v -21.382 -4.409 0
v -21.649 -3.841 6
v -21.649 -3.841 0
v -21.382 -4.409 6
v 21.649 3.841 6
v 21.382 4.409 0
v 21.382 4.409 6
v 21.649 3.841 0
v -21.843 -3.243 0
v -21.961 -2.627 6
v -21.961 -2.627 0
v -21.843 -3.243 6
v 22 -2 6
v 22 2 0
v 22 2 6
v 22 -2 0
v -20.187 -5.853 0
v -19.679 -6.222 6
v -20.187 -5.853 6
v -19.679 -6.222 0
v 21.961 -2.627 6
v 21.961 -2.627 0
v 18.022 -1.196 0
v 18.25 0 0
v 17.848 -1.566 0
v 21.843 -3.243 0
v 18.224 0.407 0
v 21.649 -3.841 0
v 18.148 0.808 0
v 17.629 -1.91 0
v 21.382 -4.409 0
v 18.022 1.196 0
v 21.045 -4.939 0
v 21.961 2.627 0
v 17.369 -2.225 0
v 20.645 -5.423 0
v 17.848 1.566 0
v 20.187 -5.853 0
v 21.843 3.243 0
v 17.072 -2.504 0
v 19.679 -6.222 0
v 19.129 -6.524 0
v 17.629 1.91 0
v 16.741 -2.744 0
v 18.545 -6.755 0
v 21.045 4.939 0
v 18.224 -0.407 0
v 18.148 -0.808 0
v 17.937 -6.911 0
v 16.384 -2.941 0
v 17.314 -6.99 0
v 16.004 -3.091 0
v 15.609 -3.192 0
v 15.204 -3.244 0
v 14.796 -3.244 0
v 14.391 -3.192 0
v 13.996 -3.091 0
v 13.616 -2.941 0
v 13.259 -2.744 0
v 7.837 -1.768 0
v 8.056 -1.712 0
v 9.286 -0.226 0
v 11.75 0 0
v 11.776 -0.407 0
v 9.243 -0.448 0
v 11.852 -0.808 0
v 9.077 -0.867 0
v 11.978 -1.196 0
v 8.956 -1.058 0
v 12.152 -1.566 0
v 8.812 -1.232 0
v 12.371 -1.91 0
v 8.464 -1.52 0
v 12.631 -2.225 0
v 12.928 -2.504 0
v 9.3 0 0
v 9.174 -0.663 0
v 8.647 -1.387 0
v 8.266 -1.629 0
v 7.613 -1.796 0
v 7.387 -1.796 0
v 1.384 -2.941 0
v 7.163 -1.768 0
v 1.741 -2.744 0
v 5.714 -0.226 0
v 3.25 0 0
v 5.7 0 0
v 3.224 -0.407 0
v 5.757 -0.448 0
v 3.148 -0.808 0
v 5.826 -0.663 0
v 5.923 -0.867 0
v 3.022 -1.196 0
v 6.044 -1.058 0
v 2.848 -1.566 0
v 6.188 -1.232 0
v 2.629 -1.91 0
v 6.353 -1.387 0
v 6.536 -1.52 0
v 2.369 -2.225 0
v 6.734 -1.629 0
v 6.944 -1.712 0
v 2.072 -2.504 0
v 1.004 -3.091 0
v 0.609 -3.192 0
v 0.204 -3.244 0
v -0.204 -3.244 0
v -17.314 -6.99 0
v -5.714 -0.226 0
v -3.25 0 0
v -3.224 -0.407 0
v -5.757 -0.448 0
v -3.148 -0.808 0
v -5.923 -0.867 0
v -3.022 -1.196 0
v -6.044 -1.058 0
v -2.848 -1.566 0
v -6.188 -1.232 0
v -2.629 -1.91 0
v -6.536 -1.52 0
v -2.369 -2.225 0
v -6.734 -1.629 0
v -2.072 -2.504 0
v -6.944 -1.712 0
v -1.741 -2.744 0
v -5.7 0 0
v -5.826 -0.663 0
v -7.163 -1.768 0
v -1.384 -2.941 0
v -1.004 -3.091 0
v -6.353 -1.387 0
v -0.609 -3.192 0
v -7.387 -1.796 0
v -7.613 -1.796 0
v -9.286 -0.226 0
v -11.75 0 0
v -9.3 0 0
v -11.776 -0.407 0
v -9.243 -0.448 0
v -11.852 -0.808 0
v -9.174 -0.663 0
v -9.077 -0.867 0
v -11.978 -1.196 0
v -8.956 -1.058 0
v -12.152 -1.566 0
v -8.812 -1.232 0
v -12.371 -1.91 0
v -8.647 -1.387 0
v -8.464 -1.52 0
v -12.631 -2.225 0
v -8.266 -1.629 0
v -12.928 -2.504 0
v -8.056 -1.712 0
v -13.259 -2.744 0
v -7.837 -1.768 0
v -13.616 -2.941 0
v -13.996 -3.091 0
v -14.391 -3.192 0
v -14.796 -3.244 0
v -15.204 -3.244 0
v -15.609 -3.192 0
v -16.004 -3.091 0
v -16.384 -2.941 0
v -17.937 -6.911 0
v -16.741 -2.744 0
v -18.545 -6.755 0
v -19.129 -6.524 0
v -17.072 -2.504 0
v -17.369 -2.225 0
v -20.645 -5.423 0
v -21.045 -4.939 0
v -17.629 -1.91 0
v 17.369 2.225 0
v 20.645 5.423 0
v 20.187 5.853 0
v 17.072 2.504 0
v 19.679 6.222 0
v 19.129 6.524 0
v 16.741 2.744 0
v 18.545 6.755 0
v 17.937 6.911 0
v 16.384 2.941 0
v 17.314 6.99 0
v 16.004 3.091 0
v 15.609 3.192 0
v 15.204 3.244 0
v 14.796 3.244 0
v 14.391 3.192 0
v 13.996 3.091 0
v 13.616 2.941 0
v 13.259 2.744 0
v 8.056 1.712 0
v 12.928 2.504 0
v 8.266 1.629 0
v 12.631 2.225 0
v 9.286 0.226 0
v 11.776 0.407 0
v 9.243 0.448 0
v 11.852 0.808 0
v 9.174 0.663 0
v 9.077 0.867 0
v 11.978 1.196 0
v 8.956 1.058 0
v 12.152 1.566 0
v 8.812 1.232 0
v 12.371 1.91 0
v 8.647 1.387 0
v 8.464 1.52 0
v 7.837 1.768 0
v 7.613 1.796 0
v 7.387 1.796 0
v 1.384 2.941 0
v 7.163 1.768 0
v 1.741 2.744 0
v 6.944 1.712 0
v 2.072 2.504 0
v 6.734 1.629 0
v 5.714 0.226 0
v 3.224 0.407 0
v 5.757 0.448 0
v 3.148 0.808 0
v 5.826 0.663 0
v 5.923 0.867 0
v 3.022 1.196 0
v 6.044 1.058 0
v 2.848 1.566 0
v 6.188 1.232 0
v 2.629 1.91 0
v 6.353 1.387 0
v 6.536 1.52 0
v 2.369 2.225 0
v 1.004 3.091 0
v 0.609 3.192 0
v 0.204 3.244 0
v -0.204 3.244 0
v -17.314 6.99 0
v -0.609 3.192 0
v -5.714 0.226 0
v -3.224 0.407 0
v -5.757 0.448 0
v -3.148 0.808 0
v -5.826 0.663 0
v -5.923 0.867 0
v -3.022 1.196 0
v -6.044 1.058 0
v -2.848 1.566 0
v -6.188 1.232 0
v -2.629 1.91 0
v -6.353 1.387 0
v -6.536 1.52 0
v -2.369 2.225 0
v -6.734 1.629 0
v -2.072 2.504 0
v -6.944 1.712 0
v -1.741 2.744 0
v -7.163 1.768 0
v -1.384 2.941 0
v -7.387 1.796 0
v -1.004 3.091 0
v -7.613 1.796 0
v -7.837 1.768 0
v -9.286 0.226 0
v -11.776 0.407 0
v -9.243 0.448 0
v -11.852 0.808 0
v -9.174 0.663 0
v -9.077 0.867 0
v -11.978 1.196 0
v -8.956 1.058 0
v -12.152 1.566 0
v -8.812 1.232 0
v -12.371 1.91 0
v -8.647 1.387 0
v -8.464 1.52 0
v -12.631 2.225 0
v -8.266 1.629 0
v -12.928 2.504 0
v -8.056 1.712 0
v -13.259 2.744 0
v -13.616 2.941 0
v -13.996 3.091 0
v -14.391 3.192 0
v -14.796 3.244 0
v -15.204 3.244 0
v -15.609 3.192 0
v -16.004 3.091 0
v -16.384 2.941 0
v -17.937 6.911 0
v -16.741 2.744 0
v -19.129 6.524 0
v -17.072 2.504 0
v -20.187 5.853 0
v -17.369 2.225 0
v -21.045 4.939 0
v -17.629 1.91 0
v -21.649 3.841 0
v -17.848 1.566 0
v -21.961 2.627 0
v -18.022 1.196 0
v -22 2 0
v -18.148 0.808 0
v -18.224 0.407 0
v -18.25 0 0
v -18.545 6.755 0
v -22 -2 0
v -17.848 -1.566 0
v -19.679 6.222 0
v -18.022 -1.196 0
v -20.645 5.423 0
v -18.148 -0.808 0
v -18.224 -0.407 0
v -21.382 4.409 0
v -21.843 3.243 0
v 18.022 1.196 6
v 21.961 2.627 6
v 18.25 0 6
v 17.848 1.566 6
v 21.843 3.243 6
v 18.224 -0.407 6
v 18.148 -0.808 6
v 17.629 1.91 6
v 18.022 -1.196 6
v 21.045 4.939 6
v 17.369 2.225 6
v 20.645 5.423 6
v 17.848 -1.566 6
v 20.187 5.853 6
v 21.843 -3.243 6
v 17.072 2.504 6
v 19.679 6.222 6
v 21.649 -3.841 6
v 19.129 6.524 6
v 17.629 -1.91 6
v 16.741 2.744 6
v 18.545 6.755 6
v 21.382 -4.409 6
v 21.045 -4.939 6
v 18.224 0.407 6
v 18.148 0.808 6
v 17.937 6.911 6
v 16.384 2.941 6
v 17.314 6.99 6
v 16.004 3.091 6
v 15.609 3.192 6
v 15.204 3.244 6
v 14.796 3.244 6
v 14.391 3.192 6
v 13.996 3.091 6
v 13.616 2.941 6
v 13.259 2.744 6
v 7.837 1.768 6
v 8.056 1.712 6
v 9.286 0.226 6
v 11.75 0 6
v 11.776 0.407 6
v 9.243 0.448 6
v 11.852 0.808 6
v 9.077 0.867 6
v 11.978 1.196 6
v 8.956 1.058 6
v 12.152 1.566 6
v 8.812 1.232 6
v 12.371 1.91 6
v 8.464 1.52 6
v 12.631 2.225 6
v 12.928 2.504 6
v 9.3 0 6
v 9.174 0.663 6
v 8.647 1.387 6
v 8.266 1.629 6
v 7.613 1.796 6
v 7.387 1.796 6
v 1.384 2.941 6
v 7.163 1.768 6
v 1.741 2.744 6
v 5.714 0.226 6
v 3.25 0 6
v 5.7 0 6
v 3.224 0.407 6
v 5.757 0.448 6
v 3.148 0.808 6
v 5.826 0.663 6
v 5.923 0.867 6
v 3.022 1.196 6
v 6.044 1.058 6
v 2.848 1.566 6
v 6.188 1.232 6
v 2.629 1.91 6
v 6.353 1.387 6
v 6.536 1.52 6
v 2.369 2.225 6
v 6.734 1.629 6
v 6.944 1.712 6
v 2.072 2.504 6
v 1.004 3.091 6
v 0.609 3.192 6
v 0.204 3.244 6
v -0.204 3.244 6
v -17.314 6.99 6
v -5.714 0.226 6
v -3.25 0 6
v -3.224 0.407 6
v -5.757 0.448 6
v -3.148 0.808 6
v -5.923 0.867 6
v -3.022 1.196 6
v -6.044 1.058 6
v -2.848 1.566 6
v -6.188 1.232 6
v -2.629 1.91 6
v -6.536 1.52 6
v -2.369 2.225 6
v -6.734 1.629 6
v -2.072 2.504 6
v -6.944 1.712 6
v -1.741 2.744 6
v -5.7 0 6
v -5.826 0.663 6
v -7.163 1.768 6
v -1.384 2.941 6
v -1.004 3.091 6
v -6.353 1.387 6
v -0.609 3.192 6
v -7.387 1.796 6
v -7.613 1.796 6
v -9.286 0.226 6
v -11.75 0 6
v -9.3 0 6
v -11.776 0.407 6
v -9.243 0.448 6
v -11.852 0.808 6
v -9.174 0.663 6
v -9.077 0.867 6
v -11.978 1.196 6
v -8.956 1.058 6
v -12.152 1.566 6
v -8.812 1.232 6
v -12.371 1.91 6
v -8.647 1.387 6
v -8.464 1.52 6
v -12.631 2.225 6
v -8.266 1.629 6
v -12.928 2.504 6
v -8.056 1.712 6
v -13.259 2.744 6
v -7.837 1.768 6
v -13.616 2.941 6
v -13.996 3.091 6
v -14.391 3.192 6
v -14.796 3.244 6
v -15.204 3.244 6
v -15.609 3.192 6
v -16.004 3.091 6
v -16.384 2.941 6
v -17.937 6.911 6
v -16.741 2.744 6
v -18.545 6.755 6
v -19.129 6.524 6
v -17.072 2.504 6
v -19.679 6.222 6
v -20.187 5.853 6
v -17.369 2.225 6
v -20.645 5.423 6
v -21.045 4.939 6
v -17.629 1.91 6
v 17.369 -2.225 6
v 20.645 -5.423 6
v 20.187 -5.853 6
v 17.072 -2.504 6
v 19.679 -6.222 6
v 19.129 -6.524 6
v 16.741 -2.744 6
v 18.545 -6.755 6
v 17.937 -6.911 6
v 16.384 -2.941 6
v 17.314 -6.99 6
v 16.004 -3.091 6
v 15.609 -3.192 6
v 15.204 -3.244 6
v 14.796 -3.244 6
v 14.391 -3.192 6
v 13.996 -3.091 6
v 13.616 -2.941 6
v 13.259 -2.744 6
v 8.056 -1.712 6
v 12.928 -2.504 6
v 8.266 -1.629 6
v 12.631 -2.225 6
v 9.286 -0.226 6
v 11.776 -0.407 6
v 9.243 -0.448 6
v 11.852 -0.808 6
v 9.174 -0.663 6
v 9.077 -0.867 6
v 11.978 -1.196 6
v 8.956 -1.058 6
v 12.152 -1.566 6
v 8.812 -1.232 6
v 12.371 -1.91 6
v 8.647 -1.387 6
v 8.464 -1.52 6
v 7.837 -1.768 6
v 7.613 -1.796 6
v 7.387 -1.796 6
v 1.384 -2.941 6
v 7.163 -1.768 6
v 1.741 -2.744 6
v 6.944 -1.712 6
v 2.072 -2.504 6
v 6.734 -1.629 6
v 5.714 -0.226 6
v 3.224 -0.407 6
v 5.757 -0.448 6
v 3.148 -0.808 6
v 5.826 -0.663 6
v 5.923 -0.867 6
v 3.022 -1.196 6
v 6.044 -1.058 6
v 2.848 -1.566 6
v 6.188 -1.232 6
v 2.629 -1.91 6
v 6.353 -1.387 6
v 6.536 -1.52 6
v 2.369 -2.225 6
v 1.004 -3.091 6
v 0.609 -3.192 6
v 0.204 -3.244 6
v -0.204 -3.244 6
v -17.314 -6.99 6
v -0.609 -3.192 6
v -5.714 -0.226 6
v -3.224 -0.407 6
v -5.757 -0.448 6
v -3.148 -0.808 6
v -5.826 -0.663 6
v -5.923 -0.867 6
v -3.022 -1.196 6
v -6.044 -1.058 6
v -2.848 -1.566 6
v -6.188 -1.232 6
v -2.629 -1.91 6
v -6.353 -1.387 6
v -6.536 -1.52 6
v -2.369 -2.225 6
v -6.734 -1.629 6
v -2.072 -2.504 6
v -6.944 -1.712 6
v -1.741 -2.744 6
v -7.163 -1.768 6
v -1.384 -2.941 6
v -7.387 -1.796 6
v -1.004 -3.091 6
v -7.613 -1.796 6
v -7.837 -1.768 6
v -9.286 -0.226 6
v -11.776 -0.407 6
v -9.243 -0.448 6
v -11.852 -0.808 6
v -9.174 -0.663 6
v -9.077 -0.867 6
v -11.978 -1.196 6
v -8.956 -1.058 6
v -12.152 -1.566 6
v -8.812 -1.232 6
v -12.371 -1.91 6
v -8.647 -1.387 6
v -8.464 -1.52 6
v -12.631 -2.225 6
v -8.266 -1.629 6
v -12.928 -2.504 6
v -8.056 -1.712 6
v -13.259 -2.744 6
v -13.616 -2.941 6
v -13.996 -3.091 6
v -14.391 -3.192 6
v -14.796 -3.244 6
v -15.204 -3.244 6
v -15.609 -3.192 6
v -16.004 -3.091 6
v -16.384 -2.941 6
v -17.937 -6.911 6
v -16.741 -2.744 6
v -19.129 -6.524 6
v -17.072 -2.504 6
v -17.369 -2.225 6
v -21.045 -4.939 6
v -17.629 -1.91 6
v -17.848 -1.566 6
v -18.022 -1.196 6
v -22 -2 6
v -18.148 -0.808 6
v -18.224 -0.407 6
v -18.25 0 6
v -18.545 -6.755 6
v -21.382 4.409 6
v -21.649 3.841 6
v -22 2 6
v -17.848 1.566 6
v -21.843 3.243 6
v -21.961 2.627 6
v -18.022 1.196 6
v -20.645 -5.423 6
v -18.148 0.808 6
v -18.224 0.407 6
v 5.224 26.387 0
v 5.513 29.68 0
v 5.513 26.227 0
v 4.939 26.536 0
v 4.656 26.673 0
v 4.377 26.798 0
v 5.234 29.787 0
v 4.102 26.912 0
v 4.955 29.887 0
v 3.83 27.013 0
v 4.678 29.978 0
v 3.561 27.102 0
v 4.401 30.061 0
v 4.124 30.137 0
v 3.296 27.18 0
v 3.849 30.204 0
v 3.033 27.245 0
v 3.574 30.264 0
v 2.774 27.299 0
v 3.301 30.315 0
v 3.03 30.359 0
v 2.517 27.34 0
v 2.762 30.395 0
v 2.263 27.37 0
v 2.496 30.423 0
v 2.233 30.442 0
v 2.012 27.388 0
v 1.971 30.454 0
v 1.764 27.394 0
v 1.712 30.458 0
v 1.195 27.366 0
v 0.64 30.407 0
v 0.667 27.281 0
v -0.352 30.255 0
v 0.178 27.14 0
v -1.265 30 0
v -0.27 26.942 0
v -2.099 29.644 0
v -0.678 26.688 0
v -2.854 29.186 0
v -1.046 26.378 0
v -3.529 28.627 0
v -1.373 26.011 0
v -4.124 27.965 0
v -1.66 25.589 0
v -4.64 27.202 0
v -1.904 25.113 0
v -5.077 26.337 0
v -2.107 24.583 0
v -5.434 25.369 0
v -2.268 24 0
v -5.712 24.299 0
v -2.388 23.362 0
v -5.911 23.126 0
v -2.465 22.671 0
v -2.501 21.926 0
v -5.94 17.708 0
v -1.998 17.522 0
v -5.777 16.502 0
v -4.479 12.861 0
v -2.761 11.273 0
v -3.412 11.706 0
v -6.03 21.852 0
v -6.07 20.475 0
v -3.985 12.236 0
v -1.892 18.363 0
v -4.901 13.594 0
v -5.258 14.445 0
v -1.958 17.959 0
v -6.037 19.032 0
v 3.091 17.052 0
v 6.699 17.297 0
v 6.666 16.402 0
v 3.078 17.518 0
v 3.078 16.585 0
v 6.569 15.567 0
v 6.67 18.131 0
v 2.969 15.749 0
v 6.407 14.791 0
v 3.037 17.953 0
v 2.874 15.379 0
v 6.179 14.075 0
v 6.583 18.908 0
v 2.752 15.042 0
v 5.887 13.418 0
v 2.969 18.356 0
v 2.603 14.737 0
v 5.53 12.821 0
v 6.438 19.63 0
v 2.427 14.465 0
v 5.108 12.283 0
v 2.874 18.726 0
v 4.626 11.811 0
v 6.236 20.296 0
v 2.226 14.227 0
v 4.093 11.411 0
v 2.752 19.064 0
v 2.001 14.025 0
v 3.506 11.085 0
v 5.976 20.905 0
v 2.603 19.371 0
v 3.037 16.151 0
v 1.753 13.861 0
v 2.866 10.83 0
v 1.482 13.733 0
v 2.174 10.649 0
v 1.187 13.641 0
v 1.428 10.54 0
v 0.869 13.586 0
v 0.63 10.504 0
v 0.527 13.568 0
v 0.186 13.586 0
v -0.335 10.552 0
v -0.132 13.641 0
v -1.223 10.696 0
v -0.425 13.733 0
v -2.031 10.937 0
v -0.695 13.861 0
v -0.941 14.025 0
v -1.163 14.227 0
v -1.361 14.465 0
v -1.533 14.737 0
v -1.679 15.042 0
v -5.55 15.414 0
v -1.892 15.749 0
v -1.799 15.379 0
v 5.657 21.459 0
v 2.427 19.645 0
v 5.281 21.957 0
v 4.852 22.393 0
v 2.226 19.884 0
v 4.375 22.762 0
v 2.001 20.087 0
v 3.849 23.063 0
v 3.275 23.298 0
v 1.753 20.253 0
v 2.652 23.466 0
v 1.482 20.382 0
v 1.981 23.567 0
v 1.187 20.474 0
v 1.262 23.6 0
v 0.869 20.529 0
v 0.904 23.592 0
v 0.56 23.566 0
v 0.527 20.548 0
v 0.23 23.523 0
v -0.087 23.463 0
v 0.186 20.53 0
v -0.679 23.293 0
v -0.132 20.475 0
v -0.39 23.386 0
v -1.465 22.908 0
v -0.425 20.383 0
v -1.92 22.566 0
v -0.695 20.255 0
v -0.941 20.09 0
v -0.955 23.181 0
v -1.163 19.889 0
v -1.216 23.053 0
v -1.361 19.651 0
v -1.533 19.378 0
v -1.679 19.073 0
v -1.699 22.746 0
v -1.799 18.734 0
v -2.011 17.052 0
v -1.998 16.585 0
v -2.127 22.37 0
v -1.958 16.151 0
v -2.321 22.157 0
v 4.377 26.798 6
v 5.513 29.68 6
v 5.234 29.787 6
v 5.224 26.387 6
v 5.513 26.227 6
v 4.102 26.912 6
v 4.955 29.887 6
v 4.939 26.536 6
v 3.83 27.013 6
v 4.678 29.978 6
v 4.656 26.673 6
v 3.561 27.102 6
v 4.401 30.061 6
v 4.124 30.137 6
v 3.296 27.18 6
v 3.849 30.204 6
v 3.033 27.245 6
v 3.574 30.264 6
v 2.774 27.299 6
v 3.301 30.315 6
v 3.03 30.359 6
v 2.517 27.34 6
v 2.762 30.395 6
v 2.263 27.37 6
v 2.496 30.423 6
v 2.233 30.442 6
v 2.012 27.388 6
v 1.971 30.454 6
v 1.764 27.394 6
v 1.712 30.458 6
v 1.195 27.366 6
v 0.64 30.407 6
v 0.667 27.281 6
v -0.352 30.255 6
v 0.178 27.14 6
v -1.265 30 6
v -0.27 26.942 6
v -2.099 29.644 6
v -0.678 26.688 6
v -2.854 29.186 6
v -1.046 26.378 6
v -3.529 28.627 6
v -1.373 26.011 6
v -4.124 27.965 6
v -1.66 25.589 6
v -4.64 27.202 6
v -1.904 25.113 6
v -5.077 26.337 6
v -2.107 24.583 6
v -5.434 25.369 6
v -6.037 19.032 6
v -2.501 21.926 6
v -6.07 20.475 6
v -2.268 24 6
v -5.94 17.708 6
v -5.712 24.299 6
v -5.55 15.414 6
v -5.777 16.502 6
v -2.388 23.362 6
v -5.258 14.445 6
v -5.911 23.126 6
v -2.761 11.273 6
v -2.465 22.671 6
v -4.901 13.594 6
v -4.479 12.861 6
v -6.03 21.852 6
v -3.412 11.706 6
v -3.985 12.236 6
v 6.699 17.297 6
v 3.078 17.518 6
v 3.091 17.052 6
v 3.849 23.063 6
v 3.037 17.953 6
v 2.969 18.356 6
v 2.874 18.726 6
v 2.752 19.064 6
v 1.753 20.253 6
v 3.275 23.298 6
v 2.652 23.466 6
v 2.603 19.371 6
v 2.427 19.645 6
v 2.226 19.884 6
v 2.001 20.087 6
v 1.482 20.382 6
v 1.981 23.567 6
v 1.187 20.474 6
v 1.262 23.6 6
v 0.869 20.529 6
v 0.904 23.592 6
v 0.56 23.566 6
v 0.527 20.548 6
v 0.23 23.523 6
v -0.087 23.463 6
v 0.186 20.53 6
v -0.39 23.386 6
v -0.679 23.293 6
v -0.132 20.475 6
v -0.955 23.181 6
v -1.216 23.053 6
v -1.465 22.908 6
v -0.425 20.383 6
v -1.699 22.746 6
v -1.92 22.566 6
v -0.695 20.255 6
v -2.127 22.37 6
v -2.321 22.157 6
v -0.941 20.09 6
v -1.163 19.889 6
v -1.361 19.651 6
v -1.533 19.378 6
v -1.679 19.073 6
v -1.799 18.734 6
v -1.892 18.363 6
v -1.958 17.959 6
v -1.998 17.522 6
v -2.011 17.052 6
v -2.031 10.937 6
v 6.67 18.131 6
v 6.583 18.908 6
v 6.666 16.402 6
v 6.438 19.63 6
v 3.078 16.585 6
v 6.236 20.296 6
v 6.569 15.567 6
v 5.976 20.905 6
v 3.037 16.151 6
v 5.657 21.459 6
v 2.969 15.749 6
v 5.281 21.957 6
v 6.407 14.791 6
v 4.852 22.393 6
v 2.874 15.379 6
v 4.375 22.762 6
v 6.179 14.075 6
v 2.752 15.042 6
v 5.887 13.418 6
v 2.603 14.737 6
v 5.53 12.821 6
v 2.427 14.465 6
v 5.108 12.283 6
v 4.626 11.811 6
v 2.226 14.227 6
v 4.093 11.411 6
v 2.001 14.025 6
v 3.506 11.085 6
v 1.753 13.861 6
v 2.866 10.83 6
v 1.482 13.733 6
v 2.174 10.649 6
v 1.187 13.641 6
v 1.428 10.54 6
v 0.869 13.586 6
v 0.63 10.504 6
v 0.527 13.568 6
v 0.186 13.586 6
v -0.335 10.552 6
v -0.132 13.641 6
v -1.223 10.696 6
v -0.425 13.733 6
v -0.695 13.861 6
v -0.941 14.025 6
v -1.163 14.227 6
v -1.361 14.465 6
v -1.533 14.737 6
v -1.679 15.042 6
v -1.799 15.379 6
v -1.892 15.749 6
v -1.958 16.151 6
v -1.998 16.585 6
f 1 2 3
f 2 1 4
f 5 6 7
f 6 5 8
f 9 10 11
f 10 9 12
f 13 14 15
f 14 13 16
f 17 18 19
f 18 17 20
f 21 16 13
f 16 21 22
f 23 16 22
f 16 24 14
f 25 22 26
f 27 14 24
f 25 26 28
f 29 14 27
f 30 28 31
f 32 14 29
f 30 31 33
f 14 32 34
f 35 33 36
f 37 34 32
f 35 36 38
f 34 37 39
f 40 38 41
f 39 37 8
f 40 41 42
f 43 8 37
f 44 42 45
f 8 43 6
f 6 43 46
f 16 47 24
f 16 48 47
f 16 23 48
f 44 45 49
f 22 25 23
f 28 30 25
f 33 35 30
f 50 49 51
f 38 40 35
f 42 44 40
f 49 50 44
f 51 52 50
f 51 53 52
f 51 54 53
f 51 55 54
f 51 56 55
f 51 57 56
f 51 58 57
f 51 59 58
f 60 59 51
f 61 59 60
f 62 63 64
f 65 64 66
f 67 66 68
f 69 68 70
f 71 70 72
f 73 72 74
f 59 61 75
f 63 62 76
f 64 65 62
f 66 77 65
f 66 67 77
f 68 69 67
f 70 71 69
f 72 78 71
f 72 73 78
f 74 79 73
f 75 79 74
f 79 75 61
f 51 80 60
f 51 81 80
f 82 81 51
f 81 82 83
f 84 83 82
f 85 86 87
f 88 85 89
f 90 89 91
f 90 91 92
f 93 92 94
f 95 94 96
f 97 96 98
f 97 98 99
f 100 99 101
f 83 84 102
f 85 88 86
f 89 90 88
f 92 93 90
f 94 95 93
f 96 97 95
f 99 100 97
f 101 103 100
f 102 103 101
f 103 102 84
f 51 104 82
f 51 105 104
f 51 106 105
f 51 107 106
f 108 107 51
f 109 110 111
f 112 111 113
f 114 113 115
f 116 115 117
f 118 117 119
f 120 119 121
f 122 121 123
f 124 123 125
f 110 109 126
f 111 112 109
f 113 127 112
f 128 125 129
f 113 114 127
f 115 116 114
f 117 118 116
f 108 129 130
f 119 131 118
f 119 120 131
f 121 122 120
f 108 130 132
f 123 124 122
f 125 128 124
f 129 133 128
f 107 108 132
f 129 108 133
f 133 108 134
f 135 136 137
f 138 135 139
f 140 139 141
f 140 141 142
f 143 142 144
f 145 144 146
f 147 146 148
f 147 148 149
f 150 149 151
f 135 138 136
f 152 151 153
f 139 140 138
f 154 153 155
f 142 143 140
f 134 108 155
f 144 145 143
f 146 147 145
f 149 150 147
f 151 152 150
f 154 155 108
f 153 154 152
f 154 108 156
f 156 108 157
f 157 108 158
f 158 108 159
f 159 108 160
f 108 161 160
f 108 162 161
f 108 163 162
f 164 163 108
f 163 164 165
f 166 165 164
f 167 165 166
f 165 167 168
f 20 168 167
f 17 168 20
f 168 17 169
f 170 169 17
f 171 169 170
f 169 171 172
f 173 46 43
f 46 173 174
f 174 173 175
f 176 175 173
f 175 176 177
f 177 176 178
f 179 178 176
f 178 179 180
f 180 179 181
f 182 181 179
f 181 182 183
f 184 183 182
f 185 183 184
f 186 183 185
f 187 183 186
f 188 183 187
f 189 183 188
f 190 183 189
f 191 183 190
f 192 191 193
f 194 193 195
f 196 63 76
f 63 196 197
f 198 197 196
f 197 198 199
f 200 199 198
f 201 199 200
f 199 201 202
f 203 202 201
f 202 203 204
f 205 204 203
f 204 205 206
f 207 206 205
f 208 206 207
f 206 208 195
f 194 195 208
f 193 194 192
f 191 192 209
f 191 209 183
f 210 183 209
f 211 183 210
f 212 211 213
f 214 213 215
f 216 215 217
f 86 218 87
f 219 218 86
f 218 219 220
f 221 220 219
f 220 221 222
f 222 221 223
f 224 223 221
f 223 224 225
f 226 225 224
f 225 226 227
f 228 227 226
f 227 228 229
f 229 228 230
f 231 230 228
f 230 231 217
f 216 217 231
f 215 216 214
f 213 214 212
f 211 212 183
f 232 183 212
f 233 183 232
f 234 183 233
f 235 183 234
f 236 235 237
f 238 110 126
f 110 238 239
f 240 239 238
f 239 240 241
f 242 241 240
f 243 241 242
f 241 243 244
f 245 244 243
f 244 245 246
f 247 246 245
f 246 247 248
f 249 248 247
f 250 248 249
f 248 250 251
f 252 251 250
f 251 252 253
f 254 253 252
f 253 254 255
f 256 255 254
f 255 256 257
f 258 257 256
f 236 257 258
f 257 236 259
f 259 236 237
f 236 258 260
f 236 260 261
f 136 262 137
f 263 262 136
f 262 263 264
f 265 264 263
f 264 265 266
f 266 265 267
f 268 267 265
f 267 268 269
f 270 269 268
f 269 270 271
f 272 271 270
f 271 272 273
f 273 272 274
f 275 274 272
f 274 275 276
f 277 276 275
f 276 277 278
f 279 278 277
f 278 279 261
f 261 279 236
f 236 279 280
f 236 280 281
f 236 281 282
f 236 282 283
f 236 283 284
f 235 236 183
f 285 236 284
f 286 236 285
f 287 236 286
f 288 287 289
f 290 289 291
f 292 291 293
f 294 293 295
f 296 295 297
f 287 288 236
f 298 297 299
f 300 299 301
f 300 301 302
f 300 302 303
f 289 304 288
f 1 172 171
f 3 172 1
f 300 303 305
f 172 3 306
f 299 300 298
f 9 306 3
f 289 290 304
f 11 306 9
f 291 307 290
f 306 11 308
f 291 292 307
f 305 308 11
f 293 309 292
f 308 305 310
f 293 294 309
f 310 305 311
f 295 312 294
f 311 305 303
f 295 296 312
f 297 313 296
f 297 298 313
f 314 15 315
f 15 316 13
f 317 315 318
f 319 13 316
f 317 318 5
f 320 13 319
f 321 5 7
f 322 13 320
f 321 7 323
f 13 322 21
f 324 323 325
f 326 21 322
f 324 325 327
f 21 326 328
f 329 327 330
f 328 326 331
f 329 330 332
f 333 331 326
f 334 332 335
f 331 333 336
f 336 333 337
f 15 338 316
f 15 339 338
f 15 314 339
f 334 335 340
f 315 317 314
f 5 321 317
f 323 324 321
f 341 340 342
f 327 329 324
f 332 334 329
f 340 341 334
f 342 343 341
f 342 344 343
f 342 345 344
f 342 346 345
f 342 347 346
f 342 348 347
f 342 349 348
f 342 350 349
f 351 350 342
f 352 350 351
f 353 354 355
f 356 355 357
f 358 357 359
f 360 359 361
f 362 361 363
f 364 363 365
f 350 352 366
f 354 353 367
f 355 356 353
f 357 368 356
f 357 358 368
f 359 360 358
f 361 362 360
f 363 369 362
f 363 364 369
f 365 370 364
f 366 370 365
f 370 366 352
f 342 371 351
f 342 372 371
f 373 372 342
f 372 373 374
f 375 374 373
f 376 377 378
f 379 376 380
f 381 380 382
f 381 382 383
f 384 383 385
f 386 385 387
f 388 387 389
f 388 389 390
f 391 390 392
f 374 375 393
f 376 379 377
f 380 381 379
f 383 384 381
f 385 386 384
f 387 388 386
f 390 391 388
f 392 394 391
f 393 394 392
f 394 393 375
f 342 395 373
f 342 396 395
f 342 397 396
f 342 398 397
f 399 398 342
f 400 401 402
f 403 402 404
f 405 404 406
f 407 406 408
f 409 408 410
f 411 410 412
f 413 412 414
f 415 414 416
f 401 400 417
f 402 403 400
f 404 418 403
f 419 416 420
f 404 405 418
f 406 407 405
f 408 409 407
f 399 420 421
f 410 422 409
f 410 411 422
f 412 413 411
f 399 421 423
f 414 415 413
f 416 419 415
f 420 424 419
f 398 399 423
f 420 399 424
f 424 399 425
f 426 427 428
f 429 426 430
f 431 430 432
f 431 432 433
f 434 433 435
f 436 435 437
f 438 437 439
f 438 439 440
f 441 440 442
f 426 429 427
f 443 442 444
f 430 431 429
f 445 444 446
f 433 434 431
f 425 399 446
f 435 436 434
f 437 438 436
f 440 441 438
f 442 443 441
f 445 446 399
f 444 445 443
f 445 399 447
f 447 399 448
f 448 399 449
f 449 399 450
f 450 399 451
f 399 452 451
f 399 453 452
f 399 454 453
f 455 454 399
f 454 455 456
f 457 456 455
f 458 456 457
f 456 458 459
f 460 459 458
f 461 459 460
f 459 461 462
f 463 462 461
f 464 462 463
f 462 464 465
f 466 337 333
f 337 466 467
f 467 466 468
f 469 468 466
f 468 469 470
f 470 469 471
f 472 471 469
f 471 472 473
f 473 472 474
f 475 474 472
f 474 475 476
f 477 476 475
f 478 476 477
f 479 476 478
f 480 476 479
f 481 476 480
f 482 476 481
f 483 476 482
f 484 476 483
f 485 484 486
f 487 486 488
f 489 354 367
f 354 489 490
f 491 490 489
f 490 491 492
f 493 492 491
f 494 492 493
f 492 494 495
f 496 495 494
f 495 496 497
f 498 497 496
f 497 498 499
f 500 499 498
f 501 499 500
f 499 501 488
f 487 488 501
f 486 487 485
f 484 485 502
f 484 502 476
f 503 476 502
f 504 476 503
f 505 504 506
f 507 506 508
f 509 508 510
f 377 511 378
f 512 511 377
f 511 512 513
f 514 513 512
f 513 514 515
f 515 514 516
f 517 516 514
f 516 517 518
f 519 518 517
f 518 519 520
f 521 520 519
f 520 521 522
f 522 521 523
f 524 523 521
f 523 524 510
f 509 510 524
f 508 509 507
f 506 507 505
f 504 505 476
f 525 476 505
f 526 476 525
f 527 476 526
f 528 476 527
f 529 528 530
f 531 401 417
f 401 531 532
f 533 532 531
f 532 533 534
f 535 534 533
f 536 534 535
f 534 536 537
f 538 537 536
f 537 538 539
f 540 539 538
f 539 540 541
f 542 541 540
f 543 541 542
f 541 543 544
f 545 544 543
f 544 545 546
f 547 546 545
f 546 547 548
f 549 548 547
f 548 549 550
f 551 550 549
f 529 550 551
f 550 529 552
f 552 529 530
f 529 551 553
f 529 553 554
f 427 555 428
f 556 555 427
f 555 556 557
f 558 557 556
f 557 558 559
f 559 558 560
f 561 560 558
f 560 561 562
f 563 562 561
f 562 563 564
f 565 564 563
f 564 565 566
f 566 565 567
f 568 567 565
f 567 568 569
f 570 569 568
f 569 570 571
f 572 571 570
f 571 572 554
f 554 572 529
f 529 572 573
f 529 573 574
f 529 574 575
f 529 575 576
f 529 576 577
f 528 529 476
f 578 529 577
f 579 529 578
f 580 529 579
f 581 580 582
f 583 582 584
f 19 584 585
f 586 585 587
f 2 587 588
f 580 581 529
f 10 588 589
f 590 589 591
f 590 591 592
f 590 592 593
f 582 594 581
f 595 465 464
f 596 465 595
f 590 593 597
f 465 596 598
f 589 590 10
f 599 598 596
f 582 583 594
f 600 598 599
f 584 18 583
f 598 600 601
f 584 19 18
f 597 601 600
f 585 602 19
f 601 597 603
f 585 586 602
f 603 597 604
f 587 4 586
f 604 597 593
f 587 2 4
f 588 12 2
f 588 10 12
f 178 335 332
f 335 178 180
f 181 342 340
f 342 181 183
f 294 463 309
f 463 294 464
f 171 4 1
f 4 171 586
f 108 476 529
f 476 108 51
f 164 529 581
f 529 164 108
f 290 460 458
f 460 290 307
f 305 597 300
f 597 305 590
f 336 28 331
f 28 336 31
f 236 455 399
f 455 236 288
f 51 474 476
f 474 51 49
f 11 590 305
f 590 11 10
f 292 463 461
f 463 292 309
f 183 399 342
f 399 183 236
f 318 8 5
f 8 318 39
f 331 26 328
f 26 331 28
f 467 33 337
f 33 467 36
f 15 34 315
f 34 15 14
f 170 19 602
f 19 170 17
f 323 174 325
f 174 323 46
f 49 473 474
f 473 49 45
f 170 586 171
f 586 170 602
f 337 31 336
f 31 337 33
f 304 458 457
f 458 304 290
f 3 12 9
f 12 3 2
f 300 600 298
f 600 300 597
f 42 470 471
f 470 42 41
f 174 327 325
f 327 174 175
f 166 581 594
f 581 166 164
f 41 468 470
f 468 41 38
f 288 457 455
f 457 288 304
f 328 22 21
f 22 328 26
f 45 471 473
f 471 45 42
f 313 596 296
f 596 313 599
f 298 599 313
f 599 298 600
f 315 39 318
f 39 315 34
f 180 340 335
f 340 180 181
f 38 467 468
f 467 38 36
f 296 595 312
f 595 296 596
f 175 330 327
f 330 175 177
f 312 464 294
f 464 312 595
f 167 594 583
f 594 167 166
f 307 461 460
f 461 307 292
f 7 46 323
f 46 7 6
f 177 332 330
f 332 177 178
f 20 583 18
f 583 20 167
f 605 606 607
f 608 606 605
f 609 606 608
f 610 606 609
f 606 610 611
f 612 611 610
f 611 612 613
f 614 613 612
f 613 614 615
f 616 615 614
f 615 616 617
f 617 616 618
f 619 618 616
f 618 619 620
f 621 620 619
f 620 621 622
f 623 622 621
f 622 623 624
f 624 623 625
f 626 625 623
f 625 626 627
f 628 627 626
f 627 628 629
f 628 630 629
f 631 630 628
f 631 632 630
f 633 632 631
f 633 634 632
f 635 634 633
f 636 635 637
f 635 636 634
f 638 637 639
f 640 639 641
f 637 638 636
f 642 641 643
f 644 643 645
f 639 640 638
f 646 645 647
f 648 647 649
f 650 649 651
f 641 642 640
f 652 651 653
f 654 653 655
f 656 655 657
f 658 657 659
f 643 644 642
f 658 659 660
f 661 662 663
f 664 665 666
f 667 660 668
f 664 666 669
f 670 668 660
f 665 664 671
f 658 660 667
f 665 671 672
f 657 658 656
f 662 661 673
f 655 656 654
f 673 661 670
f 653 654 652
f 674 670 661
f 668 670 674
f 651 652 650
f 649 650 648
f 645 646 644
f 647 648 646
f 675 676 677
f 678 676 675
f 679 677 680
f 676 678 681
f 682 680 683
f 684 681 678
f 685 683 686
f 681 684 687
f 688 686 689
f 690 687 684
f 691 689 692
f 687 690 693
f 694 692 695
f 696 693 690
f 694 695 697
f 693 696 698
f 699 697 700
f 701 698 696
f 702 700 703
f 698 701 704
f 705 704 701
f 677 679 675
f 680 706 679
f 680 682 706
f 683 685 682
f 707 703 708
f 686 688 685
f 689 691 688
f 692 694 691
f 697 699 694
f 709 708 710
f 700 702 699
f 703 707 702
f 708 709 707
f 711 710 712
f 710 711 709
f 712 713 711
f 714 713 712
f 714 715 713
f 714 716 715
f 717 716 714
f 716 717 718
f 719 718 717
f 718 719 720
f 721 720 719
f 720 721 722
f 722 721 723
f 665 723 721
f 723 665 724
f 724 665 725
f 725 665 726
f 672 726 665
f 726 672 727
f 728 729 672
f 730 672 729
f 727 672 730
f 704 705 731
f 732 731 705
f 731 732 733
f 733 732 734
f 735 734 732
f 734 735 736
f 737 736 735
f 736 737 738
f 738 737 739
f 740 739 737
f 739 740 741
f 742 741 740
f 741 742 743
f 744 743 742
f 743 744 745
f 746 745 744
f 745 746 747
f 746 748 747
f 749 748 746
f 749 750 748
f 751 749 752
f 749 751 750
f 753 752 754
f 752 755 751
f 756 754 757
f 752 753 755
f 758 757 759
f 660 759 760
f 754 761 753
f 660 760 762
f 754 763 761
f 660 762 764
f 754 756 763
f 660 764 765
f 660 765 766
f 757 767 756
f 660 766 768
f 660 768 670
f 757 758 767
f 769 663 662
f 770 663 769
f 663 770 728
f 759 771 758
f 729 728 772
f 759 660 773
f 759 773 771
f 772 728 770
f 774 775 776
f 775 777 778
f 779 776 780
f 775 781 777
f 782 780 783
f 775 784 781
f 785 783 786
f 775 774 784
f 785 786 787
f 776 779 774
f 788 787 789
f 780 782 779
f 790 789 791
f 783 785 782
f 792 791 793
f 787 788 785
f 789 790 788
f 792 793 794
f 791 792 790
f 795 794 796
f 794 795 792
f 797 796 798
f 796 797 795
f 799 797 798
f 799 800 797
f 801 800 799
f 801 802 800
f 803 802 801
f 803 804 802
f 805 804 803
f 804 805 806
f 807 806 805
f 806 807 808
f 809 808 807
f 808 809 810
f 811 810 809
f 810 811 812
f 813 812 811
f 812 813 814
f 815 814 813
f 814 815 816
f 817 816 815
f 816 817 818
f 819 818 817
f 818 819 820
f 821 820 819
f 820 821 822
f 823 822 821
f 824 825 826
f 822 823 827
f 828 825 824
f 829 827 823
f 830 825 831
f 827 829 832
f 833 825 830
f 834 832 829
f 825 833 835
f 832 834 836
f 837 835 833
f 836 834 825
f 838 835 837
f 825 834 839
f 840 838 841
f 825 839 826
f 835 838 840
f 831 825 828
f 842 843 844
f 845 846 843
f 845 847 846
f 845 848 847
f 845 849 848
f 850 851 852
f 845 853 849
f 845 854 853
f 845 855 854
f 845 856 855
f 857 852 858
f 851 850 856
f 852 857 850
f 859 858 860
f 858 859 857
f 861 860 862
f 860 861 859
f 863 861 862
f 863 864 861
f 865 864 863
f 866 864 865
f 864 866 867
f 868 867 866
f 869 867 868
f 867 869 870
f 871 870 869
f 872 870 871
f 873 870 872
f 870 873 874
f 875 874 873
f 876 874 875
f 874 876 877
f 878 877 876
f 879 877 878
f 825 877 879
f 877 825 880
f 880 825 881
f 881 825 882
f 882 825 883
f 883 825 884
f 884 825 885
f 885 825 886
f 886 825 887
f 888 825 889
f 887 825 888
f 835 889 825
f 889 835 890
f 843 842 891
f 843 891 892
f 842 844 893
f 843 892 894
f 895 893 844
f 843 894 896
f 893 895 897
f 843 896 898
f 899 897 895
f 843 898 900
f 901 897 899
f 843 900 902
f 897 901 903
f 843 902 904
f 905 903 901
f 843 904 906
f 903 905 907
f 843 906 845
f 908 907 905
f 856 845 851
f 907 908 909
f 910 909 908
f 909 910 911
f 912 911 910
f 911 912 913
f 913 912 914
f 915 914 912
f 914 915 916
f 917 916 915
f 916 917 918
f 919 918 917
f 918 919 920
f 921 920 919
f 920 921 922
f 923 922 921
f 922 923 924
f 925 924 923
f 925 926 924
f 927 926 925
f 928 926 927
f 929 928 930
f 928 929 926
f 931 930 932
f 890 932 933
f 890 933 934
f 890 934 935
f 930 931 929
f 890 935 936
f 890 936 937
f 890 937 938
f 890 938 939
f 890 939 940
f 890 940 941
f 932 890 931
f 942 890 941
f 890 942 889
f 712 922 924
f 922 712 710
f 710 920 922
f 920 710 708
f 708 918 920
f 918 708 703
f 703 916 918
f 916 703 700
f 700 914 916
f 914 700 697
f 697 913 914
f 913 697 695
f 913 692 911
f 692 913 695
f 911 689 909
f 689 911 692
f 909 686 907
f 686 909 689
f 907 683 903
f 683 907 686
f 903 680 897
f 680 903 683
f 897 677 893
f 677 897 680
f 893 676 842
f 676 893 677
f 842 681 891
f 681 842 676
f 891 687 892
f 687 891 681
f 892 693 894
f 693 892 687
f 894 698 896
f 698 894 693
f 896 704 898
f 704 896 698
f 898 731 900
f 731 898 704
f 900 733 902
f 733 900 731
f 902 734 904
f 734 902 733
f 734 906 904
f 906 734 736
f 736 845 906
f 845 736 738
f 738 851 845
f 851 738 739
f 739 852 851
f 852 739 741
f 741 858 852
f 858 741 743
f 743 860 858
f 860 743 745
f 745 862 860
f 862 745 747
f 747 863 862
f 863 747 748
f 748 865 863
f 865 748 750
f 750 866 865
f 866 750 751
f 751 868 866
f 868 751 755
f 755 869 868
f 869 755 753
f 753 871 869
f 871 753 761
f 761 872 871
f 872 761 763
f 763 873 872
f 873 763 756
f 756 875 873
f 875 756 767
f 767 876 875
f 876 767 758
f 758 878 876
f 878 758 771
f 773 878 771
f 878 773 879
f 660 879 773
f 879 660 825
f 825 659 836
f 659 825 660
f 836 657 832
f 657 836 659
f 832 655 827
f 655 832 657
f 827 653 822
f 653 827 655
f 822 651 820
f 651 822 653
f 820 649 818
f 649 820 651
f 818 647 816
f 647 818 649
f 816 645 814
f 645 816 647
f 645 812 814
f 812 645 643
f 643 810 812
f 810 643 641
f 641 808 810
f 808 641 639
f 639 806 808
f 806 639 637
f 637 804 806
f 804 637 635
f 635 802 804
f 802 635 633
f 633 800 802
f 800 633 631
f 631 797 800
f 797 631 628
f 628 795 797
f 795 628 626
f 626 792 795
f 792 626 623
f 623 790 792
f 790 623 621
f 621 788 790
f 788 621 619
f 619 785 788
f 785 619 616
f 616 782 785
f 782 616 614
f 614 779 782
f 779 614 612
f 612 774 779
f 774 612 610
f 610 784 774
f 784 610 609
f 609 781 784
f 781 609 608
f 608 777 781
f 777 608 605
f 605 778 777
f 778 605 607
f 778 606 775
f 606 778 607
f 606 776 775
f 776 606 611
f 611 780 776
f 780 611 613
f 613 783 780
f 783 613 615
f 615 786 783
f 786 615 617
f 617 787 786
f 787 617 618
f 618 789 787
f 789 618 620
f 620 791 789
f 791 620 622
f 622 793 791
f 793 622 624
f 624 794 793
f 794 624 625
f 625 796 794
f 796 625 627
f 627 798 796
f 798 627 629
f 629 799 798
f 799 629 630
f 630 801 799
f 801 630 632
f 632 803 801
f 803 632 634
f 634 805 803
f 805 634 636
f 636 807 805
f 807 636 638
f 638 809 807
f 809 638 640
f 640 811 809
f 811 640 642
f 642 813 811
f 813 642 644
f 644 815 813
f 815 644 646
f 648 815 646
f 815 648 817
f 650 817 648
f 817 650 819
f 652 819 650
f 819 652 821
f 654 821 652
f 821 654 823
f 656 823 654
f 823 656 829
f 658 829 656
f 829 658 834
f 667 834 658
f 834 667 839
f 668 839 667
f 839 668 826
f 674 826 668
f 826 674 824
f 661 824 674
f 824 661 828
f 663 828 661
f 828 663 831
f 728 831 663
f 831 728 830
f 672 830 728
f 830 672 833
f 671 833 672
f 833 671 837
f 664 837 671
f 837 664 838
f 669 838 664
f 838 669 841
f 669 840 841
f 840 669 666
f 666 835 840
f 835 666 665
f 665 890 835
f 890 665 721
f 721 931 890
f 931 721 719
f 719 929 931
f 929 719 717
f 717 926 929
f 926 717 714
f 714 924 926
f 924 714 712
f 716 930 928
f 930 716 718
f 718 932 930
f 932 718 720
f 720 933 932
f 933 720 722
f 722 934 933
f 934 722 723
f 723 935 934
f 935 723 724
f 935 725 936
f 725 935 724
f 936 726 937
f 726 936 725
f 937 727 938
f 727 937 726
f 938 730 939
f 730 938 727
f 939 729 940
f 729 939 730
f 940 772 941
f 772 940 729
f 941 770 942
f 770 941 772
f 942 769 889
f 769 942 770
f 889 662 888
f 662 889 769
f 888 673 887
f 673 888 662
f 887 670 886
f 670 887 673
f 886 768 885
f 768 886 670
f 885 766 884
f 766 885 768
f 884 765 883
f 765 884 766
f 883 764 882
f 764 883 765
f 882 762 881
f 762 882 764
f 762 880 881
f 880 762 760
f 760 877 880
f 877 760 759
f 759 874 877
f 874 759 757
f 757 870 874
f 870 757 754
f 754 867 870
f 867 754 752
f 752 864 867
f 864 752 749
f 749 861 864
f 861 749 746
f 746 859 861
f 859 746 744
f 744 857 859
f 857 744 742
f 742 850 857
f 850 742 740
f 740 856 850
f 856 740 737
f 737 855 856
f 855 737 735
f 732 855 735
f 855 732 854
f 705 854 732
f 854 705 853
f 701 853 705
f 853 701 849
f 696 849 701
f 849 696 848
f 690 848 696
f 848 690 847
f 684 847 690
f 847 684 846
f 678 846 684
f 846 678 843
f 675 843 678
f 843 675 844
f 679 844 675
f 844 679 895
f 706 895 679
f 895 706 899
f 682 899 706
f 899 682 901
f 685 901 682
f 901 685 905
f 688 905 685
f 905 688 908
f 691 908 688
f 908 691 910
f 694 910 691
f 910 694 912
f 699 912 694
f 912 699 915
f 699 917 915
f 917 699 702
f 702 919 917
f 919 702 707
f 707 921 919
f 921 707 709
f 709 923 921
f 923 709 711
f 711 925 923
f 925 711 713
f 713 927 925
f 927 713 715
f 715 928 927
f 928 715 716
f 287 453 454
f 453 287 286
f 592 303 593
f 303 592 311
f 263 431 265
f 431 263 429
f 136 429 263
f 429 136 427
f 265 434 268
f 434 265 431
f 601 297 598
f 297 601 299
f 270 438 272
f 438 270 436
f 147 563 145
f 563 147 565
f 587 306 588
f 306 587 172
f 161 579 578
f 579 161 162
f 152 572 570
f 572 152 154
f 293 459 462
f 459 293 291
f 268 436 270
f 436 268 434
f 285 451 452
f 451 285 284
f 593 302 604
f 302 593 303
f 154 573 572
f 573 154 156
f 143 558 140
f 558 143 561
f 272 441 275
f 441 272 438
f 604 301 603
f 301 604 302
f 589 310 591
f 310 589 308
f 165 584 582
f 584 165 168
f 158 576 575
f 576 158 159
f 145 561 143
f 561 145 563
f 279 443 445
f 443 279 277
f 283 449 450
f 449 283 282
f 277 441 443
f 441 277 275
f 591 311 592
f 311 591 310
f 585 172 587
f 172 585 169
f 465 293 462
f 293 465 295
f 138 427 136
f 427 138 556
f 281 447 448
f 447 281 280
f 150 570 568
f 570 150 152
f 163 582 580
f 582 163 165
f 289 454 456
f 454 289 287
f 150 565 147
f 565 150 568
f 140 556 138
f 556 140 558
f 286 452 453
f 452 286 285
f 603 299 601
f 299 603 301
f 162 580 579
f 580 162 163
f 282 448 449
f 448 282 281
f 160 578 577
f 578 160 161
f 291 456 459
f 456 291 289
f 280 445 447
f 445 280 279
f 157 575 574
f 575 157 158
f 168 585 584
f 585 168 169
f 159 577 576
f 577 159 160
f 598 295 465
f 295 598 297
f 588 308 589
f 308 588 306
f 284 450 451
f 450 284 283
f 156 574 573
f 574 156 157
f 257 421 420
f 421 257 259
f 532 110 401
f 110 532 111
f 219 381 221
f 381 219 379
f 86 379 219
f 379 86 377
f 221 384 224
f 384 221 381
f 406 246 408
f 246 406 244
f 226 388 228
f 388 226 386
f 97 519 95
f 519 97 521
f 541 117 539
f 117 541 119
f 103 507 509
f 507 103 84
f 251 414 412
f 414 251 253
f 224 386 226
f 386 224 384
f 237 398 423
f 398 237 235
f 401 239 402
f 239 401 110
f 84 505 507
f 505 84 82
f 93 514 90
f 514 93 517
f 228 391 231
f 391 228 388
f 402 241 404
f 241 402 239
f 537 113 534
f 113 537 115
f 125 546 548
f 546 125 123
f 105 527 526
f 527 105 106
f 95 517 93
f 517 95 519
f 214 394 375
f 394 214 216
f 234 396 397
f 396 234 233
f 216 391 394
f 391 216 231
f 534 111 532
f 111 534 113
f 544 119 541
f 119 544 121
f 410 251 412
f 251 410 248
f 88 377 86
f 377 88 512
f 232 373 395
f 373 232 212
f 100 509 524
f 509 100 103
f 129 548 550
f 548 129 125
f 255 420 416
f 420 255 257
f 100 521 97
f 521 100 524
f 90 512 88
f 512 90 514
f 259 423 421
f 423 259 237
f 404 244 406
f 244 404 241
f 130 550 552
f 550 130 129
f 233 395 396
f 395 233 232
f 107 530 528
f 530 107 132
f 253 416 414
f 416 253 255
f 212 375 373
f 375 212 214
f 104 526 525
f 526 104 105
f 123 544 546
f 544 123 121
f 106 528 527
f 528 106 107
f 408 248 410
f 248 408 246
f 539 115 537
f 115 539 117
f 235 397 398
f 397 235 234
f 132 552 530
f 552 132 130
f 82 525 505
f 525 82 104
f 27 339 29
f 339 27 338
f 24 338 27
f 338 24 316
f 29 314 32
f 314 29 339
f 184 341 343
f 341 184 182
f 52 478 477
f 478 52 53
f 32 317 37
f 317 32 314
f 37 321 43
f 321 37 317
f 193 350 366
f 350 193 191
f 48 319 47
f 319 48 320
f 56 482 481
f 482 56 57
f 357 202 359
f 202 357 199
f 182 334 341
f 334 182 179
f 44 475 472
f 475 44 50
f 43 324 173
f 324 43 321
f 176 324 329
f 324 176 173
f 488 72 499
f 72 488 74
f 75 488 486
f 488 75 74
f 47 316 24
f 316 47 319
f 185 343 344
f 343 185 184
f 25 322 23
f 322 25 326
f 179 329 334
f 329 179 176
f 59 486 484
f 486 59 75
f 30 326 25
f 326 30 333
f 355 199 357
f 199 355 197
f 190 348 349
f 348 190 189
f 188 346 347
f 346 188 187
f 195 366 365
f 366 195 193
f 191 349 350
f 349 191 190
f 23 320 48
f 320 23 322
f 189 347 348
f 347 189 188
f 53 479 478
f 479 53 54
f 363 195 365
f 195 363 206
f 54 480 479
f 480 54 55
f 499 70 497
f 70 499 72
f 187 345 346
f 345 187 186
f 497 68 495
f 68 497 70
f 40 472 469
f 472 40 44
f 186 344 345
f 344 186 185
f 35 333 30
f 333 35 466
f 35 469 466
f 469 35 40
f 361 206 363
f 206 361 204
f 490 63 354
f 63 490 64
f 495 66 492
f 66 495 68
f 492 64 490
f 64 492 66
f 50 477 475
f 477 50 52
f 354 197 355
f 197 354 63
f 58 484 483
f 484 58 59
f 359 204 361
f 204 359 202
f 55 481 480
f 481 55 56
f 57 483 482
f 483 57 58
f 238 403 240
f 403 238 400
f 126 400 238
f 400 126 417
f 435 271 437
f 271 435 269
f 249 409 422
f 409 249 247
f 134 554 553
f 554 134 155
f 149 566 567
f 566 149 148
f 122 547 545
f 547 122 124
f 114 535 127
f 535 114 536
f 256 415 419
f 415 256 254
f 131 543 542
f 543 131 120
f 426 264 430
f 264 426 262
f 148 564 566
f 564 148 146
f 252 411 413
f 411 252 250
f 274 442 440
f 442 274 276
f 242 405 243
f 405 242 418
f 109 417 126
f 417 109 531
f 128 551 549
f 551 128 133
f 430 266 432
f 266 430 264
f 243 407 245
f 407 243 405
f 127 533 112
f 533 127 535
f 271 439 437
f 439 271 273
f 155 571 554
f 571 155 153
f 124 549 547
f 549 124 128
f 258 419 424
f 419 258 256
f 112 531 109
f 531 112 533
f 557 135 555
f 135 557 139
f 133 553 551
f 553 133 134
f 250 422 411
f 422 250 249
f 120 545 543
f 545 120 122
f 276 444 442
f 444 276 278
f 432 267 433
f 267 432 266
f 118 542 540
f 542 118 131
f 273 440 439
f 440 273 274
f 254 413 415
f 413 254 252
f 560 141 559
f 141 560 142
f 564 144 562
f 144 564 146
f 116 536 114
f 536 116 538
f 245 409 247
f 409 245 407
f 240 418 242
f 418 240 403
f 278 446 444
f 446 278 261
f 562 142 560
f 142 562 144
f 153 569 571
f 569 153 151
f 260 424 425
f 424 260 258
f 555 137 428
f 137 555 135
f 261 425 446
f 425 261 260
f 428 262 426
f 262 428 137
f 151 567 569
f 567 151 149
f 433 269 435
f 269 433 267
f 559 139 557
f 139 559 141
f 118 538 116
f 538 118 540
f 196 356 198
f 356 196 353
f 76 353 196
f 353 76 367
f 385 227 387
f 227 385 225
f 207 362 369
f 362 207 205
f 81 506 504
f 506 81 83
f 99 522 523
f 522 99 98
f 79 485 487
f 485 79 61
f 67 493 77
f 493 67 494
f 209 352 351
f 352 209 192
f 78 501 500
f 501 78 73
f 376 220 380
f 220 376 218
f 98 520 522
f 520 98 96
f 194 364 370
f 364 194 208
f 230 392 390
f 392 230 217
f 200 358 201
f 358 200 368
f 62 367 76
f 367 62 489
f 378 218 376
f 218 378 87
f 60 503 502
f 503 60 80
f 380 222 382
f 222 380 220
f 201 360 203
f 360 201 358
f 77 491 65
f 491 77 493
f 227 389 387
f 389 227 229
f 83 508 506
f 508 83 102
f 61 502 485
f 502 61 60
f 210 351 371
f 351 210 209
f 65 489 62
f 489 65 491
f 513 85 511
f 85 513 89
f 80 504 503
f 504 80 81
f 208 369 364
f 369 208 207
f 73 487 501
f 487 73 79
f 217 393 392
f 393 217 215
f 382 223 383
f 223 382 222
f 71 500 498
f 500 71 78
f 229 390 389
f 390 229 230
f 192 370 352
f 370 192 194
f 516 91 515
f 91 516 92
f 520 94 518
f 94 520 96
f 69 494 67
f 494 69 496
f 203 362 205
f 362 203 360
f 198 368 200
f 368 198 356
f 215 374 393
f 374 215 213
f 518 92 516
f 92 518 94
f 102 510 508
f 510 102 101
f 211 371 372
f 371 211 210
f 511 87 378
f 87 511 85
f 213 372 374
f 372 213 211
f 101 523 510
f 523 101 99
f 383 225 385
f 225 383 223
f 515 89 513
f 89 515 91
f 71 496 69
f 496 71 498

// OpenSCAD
$fn = 50;


difference() {
	union() {
		hull() {
			translate(v = [-17.0000000000, 2.0000000000, 0]) {
				cylinder(h = 6, r = 5);
			}
			translate(v = [17.0000000000, 2.0000000000, 0]) {
				cylinder(h = 6, r = 5);
			}
			translate(v = [-17.0000000000, -2.0000000000, 0]) {
				cylinder(h = 6, r = 5);
			}
			translate(v = [17.0000000000, -2.0000000000, 0]) {
				cylinder(h = 6, r = 5);
			}
		}
		translate(v = [0, 30.0000000000, 0]) {
			linear_extrude(height = 6) {
				text(font = "DejaVu Sans Mono:style=Bold", halign = "center", size = 19.0000000000, text = "6", valign = "top");
			}
		}
	}
	union() {
		translate(v = [-15.0000000000, 0.0000000000, 0]) {
			translate(v = [0, 0, -100]) {
				cylinder(h = 200, r = 3.2500000000);
			}
		}
		translate(v = [0, 0, -100]) {
			cylinder(h = 200, r = 3.2500000000);
		}
		translate(v = [15.0000000000, 0.0000000000, 0]) {
			translate(v = [0, 0, -100]) {
				cylinder(h = 200, r = 3.2500000000);
			}
		}
		translate(v = [-15.0000000000, 0.0000000000, 0]) {
			translate(v = [0, 0, -100]) {
				cylinder(h = 200, r = 1.8000000000);
			}
		}
		translate(v = [-7.5000000000, 0.0000000000, 0]) {
			translate(v = [0, 0, -100]) {
				cylinder(h = 200, r = 1.8000000000);
			}
		}
		translate(v = [0, 0, -100]) {
			cylinder(h = 200, r = 1.8000000000);
		}
		translate(v = [7.5000000000, 0.0000000000, 0]) {
			translate(v = [0, 0, -100]) {
				cylinder(h = 200, r = 1.8000000000);
			}
		}
		translate(v = [15.0000000000, 0.0000000000, 0]) {
			translate(v = [0, 0, -100]) {
				cylinder(h = 200, r = 1.8000000000);
			}
		}
	}
}
